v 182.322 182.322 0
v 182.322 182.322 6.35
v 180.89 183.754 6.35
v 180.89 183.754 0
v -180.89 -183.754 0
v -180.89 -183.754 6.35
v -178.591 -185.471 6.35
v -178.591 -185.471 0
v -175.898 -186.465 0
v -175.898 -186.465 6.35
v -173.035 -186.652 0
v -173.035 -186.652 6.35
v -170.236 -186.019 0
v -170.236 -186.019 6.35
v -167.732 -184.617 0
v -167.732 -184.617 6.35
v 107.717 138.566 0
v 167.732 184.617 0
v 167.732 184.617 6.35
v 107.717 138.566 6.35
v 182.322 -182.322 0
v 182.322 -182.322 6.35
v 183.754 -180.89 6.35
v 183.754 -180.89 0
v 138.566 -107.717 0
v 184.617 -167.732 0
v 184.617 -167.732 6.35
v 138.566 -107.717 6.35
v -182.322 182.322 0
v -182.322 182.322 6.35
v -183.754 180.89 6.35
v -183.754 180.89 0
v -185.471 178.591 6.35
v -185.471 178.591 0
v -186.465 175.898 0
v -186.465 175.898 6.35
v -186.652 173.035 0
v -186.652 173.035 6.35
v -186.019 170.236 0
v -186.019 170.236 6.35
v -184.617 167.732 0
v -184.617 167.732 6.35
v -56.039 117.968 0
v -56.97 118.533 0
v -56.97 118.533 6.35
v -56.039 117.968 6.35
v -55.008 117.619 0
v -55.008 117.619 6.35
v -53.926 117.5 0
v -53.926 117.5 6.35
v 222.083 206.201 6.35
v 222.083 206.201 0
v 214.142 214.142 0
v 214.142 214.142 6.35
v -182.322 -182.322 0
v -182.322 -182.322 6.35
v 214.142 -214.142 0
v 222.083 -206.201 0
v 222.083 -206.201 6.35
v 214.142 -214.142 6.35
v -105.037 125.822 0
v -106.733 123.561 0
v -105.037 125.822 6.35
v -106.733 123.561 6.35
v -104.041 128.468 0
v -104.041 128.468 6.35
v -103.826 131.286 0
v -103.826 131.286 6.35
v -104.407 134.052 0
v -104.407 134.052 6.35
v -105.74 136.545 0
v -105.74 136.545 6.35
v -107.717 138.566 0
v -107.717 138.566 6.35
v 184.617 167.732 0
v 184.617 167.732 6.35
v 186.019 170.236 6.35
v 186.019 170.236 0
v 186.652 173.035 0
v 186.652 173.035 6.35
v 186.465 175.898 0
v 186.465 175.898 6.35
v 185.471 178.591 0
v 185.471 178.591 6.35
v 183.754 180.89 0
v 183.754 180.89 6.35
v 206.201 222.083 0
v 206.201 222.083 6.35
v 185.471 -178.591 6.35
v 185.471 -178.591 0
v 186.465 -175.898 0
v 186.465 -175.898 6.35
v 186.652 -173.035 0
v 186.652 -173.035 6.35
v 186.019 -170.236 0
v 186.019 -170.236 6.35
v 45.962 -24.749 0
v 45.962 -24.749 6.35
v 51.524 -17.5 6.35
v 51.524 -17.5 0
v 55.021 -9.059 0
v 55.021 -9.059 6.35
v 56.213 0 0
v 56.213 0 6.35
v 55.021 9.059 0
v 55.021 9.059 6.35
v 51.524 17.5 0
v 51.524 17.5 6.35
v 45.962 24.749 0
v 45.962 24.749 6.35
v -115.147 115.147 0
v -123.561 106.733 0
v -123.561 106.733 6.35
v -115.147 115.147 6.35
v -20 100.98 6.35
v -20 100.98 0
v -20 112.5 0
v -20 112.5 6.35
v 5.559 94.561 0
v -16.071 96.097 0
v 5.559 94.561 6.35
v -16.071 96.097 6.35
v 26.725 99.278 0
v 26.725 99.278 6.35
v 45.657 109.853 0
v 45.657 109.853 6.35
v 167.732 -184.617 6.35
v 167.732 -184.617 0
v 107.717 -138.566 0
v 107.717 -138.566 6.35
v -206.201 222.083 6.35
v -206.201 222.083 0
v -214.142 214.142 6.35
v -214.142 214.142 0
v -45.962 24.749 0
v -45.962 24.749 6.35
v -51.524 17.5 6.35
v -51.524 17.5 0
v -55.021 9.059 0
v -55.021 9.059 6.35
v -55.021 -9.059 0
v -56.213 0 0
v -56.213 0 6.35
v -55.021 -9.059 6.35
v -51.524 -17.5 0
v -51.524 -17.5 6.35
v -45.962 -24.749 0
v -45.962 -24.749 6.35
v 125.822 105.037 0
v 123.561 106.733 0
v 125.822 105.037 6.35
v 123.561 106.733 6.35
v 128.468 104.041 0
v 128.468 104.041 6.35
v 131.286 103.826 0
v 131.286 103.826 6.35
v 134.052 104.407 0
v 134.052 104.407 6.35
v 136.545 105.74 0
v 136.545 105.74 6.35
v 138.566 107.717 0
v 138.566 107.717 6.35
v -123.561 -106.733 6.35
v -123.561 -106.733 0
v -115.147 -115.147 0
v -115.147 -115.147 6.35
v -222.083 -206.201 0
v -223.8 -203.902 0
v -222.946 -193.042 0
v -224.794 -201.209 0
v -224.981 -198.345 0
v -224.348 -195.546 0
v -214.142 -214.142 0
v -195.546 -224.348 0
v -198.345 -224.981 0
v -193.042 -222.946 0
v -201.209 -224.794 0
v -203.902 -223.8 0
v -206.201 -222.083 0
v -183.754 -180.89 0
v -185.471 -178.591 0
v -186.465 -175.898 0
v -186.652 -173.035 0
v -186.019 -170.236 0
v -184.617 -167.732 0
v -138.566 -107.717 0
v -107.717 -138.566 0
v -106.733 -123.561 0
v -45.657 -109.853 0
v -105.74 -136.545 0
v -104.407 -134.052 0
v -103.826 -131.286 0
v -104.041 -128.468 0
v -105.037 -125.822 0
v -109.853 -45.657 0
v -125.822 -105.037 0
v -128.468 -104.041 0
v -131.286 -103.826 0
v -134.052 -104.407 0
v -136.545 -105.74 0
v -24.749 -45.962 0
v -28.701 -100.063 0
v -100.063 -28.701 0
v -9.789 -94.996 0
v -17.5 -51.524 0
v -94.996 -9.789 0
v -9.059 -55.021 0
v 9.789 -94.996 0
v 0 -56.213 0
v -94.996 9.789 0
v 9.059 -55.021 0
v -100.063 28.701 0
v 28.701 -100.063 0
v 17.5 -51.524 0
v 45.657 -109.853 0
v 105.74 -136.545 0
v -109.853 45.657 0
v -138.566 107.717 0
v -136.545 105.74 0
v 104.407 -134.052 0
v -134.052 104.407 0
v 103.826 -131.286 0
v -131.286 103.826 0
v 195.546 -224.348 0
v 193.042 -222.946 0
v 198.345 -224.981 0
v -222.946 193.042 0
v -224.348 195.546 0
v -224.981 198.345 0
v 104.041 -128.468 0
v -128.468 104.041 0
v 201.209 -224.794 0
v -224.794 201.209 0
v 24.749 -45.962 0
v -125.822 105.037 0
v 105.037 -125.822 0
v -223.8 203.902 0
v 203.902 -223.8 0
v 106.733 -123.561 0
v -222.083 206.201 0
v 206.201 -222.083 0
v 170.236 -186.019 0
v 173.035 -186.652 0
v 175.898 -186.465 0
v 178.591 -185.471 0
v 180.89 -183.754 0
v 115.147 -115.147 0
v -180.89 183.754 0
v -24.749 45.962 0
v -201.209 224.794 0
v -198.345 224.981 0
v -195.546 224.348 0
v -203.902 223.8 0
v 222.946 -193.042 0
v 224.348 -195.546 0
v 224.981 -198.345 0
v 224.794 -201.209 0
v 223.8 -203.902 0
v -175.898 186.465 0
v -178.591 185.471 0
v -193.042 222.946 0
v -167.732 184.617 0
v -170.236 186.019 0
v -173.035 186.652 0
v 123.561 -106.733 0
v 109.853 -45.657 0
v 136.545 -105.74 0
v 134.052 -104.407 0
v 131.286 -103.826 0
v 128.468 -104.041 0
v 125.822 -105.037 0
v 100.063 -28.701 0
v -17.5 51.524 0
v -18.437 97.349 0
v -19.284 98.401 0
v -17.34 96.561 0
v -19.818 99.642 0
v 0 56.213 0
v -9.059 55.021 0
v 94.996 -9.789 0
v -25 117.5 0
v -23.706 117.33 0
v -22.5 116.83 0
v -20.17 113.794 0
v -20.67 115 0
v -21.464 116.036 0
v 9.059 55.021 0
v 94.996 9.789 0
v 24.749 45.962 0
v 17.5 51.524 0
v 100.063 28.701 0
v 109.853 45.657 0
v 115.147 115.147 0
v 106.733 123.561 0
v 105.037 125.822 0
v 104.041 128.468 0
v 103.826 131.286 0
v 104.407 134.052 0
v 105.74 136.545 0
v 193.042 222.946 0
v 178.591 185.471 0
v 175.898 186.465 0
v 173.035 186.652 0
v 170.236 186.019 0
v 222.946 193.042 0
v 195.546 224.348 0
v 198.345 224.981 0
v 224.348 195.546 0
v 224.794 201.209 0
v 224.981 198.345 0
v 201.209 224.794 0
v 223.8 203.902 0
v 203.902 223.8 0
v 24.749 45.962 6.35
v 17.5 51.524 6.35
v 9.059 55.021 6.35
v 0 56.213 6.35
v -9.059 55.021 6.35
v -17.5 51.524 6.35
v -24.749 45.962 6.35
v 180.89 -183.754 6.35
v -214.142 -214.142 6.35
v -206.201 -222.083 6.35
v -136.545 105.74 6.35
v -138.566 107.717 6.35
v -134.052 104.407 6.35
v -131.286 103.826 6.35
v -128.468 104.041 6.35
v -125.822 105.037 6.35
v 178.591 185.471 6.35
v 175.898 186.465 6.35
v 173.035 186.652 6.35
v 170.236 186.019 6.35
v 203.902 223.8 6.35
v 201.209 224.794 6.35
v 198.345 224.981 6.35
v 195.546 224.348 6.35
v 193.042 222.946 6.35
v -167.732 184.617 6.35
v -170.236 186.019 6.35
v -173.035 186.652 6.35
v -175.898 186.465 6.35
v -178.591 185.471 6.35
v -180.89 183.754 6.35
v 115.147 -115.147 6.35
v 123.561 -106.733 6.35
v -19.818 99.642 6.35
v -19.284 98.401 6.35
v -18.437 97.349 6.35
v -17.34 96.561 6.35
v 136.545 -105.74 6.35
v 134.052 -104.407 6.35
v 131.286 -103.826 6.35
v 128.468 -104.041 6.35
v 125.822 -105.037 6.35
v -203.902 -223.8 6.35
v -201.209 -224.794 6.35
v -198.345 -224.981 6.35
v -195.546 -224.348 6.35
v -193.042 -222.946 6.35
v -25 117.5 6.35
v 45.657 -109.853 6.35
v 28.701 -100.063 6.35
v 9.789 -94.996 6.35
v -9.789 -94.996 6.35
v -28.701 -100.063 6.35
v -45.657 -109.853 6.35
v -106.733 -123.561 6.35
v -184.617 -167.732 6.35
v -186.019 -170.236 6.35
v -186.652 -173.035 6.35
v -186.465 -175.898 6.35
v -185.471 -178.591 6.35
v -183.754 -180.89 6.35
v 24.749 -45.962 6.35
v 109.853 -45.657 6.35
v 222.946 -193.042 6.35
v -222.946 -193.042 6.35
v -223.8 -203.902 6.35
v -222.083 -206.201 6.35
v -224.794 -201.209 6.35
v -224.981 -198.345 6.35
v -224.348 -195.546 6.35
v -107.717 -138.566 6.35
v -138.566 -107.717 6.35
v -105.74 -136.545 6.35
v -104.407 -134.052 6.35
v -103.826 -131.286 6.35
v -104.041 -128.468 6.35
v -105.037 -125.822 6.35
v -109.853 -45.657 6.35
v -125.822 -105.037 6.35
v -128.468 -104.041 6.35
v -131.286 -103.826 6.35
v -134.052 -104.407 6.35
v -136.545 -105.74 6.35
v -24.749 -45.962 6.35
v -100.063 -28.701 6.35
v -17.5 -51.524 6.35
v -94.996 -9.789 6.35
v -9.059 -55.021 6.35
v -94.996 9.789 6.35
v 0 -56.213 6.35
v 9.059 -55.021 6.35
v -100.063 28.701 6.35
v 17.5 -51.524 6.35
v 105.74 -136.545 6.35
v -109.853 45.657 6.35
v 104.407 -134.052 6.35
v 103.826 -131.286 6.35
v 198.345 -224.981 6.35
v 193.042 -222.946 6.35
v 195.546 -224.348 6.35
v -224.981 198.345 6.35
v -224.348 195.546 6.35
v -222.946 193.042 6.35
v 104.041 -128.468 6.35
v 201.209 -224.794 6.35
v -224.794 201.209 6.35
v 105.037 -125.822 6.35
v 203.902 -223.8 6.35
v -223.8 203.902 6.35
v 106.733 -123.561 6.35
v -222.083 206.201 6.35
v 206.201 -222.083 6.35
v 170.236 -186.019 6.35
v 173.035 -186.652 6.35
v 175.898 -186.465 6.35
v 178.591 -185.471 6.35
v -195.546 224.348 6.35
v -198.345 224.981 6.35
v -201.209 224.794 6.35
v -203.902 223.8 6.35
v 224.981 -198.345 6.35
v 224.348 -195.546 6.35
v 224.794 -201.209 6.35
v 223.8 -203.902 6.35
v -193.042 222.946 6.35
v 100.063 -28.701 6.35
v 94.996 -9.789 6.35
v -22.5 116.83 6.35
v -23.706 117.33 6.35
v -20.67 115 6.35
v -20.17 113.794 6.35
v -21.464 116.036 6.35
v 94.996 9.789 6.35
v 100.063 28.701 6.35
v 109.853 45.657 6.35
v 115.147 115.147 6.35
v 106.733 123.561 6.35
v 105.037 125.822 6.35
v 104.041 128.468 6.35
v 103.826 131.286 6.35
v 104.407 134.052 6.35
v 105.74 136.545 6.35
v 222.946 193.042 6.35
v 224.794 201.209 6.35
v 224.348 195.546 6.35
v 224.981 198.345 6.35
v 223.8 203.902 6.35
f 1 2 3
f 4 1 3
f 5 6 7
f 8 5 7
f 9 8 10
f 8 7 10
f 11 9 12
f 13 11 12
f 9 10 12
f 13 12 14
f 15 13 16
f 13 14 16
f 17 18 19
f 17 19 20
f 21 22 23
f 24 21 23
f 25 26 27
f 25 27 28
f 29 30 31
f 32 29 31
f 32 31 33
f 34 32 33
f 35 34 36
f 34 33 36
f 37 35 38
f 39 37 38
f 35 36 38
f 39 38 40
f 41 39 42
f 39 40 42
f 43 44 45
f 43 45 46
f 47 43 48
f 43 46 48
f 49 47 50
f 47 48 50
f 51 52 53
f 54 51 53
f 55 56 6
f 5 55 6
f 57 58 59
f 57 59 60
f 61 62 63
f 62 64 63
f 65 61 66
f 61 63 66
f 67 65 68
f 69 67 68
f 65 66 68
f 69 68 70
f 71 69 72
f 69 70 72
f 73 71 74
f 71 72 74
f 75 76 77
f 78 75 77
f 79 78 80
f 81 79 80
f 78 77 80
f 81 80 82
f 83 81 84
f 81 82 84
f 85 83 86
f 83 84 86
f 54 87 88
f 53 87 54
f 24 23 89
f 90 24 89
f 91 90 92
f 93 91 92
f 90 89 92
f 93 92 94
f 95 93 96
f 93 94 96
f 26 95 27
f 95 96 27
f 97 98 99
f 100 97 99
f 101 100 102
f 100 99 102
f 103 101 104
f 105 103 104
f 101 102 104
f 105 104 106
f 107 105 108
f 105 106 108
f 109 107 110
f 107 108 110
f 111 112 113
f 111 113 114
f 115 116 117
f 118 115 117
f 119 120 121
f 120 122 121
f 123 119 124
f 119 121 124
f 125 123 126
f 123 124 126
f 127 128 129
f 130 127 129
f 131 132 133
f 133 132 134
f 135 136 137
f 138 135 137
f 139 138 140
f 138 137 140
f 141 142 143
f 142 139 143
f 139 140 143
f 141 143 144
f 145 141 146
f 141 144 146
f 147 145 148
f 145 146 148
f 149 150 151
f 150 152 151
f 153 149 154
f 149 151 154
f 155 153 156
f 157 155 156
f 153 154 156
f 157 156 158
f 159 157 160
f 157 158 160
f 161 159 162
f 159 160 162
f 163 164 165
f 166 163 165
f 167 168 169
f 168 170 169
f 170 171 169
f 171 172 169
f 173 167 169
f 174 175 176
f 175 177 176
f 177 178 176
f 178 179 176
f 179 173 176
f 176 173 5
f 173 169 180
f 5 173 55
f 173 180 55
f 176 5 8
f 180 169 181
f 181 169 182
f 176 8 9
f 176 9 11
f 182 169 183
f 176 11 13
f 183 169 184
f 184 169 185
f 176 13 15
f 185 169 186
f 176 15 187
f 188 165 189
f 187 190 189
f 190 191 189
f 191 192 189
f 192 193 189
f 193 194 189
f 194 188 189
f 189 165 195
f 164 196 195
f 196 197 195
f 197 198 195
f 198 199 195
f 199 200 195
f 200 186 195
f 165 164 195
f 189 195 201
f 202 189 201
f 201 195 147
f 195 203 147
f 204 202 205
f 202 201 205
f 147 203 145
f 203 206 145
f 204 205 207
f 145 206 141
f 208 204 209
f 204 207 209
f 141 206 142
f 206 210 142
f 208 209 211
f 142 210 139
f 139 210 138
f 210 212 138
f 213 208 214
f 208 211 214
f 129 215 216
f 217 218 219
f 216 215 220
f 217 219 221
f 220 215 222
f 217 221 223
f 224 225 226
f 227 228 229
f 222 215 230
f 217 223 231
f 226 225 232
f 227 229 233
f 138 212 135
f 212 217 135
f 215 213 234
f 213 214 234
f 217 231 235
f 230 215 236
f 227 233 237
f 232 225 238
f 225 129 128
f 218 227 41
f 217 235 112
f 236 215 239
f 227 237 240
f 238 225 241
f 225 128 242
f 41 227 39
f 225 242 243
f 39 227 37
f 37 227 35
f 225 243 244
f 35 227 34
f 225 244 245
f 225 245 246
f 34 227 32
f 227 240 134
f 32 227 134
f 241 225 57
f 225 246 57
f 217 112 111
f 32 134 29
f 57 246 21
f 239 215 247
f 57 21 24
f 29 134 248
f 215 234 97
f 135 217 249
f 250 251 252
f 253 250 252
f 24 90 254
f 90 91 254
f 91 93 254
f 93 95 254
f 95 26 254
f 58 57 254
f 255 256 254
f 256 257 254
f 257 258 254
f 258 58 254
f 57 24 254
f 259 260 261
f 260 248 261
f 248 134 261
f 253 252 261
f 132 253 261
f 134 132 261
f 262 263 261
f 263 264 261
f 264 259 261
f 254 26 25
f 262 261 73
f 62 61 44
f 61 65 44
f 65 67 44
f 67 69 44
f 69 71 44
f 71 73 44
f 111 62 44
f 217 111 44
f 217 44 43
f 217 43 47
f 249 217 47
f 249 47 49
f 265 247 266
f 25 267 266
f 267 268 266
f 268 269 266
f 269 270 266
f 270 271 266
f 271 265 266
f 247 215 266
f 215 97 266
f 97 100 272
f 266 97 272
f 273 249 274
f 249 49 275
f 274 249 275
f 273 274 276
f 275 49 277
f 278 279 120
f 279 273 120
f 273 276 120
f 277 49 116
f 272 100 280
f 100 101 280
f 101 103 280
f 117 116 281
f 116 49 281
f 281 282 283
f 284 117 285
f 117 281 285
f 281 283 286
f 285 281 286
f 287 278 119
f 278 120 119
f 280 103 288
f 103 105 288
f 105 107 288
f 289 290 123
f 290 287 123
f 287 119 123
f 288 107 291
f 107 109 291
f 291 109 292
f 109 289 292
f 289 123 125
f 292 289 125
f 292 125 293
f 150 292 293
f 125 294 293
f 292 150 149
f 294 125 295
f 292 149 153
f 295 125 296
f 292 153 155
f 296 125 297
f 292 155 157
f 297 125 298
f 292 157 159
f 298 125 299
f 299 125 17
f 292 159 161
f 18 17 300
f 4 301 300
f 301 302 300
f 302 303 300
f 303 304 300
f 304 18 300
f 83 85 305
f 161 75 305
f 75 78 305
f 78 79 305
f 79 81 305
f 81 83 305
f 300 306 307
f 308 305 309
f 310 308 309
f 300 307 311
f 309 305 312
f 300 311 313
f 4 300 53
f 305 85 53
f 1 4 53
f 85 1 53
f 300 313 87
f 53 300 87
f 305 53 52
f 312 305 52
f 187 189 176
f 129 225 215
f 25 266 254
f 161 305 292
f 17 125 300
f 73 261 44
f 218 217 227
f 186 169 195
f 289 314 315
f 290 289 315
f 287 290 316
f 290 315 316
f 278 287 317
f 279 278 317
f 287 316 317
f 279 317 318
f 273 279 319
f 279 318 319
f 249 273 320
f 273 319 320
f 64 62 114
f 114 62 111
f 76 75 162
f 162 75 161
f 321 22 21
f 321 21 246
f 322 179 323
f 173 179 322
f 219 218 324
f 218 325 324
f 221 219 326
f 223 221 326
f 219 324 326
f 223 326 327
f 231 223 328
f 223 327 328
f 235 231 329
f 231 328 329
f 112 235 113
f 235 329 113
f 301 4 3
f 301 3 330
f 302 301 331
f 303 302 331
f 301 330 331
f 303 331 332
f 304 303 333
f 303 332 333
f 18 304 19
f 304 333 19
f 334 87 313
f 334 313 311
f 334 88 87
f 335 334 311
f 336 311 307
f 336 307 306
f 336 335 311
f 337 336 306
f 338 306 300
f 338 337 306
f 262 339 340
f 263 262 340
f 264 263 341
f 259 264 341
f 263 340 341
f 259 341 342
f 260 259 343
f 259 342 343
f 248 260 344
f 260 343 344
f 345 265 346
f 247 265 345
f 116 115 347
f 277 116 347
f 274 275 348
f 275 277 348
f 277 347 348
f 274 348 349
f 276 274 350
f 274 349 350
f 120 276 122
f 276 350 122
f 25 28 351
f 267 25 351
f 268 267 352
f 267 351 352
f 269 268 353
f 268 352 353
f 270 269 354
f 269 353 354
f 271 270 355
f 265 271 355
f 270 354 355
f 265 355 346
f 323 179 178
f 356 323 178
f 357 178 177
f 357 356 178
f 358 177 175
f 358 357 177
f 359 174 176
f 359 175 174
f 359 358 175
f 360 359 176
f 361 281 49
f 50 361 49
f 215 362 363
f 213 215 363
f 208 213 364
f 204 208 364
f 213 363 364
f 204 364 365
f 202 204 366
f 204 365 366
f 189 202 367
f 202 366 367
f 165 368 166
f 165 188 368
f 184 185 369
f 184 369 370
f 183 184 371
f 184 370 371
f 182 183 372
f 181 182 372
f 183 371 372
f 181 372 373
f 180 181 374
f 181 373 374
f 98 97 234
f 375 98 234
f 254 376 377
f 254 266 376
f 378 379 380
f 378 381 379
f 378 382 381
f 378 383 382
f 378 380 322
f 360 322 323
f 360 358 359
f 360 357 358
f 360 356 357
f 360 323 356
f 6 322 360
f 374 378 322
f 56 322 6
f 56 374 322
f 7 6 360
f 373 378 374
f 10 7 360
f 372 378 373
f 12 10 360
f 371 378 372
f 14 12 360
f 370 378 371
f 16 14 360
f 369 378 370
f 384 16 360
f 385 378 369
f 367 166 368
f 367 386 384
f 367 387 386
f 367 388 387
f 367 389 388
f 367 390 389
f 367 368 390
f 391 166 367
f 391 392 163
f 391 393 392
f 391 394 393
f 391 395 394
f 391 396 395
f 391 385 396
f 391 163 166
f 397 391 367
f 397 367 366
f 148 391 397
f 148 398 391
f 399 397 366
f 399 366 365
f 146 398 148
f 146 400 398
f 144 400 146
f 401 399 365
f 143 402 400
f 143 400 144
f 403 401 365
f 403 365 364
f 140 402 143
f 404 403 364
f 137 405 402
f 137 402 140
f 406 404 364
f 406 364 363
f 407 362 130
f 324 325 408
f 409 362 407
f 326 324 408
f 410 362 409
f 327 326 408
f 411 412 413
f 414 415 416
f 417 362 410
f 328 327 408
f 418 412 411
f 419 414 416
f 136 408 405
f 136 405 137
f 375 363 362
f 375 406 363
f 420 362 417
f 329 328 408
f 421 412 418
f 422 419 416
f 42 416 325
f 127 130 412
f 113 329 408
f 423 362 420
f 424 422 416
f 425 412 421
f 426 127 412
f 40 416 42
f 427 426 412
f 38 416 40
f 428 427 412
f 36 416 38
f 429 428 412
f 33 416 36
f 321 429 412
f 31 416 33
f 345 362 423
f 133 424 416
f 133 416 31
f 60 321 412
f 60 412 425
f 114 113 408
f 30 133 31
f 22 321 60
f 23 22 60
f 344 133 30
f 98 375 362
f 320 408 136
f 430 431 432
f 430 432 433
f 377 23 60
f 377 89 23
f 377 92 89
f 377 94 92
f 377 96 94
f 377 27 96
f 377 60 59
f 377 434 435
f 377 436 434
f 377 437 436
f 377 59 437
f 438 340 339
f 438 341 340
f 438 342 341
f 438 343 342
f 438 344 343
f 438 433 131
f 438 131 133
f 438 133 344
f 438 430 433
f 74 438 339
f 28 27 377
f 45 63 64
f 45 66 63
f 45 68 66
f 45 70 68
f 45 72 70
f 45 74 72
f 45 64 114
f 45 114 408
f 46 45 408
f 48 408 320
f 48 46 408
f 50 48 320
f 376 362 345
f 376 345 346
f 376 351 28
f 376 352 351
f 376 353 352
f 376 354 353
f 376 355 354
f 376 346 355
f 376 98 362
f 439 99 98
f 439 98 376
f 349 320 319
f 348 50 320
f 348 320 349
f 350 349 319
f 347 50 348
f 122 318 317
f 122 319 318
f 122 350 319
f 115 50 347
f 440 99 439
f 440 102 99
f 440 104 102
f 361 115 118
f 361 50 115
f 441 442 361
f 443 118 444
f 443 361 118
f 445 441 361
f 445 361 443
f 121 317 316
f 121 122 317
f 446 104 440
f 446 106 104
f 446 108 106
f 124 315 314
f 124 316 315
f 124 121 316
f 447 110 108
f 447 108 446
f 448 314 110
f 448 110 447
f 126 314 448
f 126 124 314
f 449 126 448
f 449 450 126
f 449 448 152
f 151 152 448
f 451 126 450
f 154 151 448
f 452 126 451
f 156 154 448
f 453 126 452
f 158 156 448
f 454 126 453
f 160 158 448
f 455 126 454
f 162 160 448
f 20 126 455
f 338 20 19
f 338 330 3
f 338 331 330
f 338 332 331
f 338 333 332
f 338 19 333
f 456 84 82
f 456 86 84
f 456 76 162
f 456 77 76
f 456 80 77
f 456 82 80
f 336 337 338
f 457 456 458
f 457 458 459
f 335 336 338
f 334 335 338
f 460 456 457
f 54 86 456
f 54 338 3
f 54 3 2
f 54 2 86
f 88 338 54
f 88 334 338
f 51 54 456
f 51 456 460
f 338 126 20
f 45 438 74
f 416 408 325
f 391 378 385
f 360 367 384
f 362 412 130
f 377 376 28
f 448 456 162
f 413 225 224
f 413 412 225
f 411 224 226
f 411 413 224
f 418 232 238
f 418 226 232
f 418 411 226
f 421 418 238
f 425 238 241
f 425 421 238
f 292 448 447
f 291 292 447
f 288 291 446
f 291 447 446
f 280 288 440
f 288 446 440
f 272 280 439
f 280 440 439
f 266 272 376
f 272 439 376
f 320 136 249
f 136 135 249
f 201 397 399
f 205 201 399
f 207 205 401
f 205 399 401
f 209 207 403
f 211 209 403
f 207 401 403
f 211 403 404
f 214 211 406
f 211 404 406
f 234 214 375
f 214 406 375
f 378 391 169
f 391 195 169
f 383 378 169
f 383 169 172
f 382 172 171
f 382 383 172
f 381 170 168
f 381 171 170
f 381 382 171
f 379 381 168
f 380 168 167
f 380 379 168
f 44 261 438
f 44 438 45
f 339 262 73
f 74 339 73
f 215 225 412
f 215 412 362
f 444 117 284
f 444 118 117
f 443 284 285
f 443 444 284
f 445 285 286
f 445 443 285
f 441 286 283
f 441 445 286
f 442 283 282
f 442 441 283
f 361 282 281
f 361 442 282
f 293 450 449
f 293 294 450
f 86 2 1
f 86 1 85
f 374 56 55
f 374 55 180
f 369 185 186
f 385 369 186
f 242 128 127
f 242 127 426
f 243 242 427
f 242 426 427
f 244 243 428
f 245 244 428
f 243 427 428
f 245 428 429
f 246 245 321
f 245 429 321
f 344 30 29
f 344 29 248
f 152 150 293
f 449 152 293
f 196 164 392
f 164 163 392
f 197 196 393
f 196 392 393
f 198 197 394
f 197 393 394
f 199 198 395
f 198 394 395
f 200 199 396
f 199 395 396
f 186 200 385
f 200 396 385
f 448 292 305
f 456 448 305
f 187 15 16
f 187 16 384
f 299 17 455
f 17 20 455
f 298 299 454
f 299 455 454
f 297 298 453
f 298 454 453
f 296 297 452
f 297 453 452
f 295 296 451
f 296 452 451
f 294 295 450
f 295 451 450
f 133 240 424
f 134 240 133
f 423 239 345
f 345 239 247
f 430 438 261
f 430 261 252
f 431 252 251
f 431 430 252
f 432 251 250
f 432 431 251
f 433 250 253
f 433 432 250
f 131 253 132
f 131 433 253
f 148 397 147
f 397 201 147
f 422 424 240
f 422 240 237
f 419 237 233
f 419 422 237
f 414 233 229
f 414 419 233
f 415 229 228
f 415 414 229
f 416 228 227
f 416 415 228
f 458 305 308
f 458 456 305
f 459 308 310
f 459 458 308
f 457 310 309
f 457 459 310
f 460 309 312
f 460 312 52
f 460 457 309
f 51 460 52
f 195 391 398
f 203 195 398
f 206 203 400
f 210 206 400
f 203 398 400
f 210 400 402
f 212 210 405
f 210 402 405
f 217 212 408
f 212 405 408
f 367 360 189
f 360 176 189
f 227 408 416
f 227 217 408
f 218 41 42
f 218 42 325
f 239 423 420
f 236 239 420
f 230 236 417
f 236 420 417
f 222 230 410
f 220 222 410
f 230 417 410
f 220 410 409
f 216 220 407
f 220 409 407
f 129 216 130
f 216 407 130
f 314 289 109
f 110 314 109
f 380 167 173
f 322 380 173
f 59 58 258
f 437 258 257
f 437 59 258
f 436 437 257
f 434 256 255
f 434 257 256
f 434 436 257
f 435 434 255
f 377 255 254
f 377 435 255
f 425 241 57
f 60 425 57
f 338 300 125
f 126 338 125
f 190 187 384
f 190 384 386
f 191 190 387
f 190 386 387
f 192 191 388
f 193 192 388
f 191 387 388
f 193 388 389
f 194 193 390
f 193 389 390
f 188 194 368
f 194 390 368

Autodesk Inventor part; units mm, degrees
ref_plane "YZ Plane" through (0, 0, 0) normal (1, 0, 0) x (0, 1, 0)
ref_plane "XZ Plane" through (0, 0, 0) normal (0, 1, 0) x (-1, 0, 0)
ref_plane "XY Plane" through (0, 0, 0) normal (0, 0, 1) x (1, 0, 0)
sketch "Plate" plane through (0, 0, 0) normal (0, 0, 1) x (1, 0, 0)
  line L0 (-200, -200) -> (200, -200) construction
  line L1 (200, -200) -> (200, 200) construction
  line L2 (200, 200) -> (-200, 200) construction
  line L3 (-200, 200) -> (-200, -200) construction
  line L4 (-200, -200) -> (200, 200) construction
  line L5 (200, -200) -> (-200, 200) construction
  line L6 (0, 0) -> (0, 420.657) construction
  line L7 (0, 0) -> (461.6465, 0) construction
  line L8 (0, 202) -> (202, 202) construction
  line L9 (202, 202) -> (202, 0) construction
  line L10 (74.8189, 0) -> (251.7605, 230.5948) construction
  line L11 (254.8388, 145.1612) -> (158.001, 241.999) construction
  line L12 (252.9755, 175.3088) -> (179.3809, 248.9034) construction
  line L13 (74.8189, 0) -> (228.2843, 200)
  line L14 (200, 200) -> (231.4665, 231.4665) construction
  line L15 (228.2843, 200) -> (214.1421, 214.1421)
  line L16 (200, 228.2843) -> (214.1421, 214.1421)
  line L17 (200, 228.2843) -> (0, 74.8189)
  line L18 (-74.8189, 0) -> (-228.2843, 200)
  line L19 (-228.2843, 200) -> (-214.1421, 214.1421)
  line L20 (-200, 228.2843) -> (-214.1421, 214.1421)
  line L21 (-200, 228.2843) -> (0, 74.8189)
  line L22 (74.8189, 0) -> (228.2843, -200)
  line L23 (228.2843, -200) -> (214.1421, -214.1421)
  line L24 (200, -228.2843) -> (214.1421, -214.1421)
  line L25 (200, -228.2843) -> (0, -74.8189)
  line L26 (-200, -228.2843) -> (0, -74.8189)
  line L27 (-200, -228.2843) -> (-214.1421, -214.1421)
  line L28 (-228.2843, -200) -> (-214.1421, -214.1421)
  line L29 (-74.8189, 0) -> (-228.2843, -200)
  dimension "d136" = 10
  dimension "d12" = 200
  dimension "d79" = 200
  dimension "d80" = 2
  dimension "d81" = 2
  dimension "d83" = 20
  dimension "d84" = 7.5
  dimension "d85" = 20
  dimension "d86" = 7.5
extrude "Base" add sketch "Plate" along normal blind 6.35
sketch "Sketch3" plane through (0, 0, 0) normal (0, 0, 1) x (1, 0, 0)
  line L0 (-70.7107, 0) -> (0, 70.7107)
  line L1 (0, 70.7107) -> (70.7107, 0)
  line L2 (70.7107, 0) -> (0, -70.7107)
  line L3 (0, -70.7107) -> (-70.7107, 0)
  line L4 (-70.7107, 0) -> (70.7107, 0) construction
  line L5 (0, 70.7107) -> (0, -70.7107) construction
  point P0 (0, 0)
  dimension "d76" = 90
  dimension "d77" = 100
extrude "Center hole" cut sketch "Sketch3" along normal through all
fillet "Fillet2" radius 75 4 edges at (0, 74.8189, 3.175) (-74.8189, 0, 3.175) (0, -74.8189, 3.175) (74.8189, 0, 3.175)
fillet "Fillet3" radius 35 4 edges at (-70.7107, 0, 3.175) (0, 70.7107, 3.175) (70.7107, 0, 3.175) (0, -70.7107, 3.175)
fillet "Fillet4" radius 10 8 edges at (200, 228.2843, 3.175) (228.2843, 200, 3.175) (228.2843, -200, 3.175) (200, -228.2843, 3.175) (-200, -228.2843, 3.175) (-228.2843, -200, 3.175) (-200, 228.2843, 3.175) (-228.2843, 200, 3.175)
sketch "Sketch17" plane through (0, 0, 0) normal (0, 0, 1) x (1, 0, 0)
  line L0 (-200, -200) -> (200, 200) construction
  line L1 (254.8388, 145.1612) -> (158.001, 241.999) construction
  line L2 (182.3223, 182.3223) -> (174.6892, 189.9555)
  line L3 (174.6892, 189.9555) -> (98.6702, 131.6241)
  line L4 (98.6702, 131.6241) -> (115.1472, 115.1472)
  line L5 (193.0425, 222.9456) -> (45.6571, 109.8528) construction
  line L6 (182.3223, 182.3223) -> (189.9555, 174.6892)
  line L7 (189.9555, 174.6892) -> (131.6241, 98.6702)
  line L8 (131.6241, 98.6702) -> (115.1472, 115.1472)
  point P0 (0, 0)
  dimension "d133" = 15
  dimension "d134" = 25
  dimension "d135" = 95
extrude "Extrusion4" cut sketch "Sketch17" along normal through all
fillet "Fillet5" radius 10 4 edges at (174.6892, 189.9555, 3.175) (189.9555, 174.6892, 3.175) (131.6241, 98.6702, 3.175) (98.6702, 131.6241, 3.175)
pattern_circular "Circular Pattern2" count 4 over 360 about axis through (0, 0, -10) along (0, 0, 1) of "Extrusion4", "Fillet5"
sketch "Sketch18" plane through (0, 0, 0) normal (0, 0, 1) x (1, 0, 0)
  arc A0 (-45.6571, 109.8528) -> (45.6571, 109.8528) centre (0, 169.3543) ccw construction
  line L0 (-20, 97.0701) -> (-20, 117.5)
  line L1 (-20, 117.5) -> (-55.6231, 117.5)
  line L2 (-69.5, 100.125) -> (-72.5, 100.125) projected
  arc A1 (-69.5, 92.875) -> (-69.5, 98.125) centre (-69.5, 95.5) ccw construction
  line L3 (-45.6571, 109.8528) -> (-193.0425, 222.9456) construction
  line L4 (-55.6231, 117.5) -> (-45.6571, 109.8528)
  arc A2 (-45.6571, 109.8528) -> (-20, 97.0701) centre (0, 169.3543) ccw
  point P0 (0, 0)
  dimension "d144" = 20
  dimension "d146" = 22
extrude "Limit nub" add sketch "Sketch18" along normal up to surface (6.35 mm away)
fillet "Fillet6" radius 5 3 edges at (-55.6231, 117.5, 3.175) (-20, 97.0701, 3.175) (-20, 117.5, 3.175)
properties part number "6061 Bed no holes" material "Aluminum 6061"
